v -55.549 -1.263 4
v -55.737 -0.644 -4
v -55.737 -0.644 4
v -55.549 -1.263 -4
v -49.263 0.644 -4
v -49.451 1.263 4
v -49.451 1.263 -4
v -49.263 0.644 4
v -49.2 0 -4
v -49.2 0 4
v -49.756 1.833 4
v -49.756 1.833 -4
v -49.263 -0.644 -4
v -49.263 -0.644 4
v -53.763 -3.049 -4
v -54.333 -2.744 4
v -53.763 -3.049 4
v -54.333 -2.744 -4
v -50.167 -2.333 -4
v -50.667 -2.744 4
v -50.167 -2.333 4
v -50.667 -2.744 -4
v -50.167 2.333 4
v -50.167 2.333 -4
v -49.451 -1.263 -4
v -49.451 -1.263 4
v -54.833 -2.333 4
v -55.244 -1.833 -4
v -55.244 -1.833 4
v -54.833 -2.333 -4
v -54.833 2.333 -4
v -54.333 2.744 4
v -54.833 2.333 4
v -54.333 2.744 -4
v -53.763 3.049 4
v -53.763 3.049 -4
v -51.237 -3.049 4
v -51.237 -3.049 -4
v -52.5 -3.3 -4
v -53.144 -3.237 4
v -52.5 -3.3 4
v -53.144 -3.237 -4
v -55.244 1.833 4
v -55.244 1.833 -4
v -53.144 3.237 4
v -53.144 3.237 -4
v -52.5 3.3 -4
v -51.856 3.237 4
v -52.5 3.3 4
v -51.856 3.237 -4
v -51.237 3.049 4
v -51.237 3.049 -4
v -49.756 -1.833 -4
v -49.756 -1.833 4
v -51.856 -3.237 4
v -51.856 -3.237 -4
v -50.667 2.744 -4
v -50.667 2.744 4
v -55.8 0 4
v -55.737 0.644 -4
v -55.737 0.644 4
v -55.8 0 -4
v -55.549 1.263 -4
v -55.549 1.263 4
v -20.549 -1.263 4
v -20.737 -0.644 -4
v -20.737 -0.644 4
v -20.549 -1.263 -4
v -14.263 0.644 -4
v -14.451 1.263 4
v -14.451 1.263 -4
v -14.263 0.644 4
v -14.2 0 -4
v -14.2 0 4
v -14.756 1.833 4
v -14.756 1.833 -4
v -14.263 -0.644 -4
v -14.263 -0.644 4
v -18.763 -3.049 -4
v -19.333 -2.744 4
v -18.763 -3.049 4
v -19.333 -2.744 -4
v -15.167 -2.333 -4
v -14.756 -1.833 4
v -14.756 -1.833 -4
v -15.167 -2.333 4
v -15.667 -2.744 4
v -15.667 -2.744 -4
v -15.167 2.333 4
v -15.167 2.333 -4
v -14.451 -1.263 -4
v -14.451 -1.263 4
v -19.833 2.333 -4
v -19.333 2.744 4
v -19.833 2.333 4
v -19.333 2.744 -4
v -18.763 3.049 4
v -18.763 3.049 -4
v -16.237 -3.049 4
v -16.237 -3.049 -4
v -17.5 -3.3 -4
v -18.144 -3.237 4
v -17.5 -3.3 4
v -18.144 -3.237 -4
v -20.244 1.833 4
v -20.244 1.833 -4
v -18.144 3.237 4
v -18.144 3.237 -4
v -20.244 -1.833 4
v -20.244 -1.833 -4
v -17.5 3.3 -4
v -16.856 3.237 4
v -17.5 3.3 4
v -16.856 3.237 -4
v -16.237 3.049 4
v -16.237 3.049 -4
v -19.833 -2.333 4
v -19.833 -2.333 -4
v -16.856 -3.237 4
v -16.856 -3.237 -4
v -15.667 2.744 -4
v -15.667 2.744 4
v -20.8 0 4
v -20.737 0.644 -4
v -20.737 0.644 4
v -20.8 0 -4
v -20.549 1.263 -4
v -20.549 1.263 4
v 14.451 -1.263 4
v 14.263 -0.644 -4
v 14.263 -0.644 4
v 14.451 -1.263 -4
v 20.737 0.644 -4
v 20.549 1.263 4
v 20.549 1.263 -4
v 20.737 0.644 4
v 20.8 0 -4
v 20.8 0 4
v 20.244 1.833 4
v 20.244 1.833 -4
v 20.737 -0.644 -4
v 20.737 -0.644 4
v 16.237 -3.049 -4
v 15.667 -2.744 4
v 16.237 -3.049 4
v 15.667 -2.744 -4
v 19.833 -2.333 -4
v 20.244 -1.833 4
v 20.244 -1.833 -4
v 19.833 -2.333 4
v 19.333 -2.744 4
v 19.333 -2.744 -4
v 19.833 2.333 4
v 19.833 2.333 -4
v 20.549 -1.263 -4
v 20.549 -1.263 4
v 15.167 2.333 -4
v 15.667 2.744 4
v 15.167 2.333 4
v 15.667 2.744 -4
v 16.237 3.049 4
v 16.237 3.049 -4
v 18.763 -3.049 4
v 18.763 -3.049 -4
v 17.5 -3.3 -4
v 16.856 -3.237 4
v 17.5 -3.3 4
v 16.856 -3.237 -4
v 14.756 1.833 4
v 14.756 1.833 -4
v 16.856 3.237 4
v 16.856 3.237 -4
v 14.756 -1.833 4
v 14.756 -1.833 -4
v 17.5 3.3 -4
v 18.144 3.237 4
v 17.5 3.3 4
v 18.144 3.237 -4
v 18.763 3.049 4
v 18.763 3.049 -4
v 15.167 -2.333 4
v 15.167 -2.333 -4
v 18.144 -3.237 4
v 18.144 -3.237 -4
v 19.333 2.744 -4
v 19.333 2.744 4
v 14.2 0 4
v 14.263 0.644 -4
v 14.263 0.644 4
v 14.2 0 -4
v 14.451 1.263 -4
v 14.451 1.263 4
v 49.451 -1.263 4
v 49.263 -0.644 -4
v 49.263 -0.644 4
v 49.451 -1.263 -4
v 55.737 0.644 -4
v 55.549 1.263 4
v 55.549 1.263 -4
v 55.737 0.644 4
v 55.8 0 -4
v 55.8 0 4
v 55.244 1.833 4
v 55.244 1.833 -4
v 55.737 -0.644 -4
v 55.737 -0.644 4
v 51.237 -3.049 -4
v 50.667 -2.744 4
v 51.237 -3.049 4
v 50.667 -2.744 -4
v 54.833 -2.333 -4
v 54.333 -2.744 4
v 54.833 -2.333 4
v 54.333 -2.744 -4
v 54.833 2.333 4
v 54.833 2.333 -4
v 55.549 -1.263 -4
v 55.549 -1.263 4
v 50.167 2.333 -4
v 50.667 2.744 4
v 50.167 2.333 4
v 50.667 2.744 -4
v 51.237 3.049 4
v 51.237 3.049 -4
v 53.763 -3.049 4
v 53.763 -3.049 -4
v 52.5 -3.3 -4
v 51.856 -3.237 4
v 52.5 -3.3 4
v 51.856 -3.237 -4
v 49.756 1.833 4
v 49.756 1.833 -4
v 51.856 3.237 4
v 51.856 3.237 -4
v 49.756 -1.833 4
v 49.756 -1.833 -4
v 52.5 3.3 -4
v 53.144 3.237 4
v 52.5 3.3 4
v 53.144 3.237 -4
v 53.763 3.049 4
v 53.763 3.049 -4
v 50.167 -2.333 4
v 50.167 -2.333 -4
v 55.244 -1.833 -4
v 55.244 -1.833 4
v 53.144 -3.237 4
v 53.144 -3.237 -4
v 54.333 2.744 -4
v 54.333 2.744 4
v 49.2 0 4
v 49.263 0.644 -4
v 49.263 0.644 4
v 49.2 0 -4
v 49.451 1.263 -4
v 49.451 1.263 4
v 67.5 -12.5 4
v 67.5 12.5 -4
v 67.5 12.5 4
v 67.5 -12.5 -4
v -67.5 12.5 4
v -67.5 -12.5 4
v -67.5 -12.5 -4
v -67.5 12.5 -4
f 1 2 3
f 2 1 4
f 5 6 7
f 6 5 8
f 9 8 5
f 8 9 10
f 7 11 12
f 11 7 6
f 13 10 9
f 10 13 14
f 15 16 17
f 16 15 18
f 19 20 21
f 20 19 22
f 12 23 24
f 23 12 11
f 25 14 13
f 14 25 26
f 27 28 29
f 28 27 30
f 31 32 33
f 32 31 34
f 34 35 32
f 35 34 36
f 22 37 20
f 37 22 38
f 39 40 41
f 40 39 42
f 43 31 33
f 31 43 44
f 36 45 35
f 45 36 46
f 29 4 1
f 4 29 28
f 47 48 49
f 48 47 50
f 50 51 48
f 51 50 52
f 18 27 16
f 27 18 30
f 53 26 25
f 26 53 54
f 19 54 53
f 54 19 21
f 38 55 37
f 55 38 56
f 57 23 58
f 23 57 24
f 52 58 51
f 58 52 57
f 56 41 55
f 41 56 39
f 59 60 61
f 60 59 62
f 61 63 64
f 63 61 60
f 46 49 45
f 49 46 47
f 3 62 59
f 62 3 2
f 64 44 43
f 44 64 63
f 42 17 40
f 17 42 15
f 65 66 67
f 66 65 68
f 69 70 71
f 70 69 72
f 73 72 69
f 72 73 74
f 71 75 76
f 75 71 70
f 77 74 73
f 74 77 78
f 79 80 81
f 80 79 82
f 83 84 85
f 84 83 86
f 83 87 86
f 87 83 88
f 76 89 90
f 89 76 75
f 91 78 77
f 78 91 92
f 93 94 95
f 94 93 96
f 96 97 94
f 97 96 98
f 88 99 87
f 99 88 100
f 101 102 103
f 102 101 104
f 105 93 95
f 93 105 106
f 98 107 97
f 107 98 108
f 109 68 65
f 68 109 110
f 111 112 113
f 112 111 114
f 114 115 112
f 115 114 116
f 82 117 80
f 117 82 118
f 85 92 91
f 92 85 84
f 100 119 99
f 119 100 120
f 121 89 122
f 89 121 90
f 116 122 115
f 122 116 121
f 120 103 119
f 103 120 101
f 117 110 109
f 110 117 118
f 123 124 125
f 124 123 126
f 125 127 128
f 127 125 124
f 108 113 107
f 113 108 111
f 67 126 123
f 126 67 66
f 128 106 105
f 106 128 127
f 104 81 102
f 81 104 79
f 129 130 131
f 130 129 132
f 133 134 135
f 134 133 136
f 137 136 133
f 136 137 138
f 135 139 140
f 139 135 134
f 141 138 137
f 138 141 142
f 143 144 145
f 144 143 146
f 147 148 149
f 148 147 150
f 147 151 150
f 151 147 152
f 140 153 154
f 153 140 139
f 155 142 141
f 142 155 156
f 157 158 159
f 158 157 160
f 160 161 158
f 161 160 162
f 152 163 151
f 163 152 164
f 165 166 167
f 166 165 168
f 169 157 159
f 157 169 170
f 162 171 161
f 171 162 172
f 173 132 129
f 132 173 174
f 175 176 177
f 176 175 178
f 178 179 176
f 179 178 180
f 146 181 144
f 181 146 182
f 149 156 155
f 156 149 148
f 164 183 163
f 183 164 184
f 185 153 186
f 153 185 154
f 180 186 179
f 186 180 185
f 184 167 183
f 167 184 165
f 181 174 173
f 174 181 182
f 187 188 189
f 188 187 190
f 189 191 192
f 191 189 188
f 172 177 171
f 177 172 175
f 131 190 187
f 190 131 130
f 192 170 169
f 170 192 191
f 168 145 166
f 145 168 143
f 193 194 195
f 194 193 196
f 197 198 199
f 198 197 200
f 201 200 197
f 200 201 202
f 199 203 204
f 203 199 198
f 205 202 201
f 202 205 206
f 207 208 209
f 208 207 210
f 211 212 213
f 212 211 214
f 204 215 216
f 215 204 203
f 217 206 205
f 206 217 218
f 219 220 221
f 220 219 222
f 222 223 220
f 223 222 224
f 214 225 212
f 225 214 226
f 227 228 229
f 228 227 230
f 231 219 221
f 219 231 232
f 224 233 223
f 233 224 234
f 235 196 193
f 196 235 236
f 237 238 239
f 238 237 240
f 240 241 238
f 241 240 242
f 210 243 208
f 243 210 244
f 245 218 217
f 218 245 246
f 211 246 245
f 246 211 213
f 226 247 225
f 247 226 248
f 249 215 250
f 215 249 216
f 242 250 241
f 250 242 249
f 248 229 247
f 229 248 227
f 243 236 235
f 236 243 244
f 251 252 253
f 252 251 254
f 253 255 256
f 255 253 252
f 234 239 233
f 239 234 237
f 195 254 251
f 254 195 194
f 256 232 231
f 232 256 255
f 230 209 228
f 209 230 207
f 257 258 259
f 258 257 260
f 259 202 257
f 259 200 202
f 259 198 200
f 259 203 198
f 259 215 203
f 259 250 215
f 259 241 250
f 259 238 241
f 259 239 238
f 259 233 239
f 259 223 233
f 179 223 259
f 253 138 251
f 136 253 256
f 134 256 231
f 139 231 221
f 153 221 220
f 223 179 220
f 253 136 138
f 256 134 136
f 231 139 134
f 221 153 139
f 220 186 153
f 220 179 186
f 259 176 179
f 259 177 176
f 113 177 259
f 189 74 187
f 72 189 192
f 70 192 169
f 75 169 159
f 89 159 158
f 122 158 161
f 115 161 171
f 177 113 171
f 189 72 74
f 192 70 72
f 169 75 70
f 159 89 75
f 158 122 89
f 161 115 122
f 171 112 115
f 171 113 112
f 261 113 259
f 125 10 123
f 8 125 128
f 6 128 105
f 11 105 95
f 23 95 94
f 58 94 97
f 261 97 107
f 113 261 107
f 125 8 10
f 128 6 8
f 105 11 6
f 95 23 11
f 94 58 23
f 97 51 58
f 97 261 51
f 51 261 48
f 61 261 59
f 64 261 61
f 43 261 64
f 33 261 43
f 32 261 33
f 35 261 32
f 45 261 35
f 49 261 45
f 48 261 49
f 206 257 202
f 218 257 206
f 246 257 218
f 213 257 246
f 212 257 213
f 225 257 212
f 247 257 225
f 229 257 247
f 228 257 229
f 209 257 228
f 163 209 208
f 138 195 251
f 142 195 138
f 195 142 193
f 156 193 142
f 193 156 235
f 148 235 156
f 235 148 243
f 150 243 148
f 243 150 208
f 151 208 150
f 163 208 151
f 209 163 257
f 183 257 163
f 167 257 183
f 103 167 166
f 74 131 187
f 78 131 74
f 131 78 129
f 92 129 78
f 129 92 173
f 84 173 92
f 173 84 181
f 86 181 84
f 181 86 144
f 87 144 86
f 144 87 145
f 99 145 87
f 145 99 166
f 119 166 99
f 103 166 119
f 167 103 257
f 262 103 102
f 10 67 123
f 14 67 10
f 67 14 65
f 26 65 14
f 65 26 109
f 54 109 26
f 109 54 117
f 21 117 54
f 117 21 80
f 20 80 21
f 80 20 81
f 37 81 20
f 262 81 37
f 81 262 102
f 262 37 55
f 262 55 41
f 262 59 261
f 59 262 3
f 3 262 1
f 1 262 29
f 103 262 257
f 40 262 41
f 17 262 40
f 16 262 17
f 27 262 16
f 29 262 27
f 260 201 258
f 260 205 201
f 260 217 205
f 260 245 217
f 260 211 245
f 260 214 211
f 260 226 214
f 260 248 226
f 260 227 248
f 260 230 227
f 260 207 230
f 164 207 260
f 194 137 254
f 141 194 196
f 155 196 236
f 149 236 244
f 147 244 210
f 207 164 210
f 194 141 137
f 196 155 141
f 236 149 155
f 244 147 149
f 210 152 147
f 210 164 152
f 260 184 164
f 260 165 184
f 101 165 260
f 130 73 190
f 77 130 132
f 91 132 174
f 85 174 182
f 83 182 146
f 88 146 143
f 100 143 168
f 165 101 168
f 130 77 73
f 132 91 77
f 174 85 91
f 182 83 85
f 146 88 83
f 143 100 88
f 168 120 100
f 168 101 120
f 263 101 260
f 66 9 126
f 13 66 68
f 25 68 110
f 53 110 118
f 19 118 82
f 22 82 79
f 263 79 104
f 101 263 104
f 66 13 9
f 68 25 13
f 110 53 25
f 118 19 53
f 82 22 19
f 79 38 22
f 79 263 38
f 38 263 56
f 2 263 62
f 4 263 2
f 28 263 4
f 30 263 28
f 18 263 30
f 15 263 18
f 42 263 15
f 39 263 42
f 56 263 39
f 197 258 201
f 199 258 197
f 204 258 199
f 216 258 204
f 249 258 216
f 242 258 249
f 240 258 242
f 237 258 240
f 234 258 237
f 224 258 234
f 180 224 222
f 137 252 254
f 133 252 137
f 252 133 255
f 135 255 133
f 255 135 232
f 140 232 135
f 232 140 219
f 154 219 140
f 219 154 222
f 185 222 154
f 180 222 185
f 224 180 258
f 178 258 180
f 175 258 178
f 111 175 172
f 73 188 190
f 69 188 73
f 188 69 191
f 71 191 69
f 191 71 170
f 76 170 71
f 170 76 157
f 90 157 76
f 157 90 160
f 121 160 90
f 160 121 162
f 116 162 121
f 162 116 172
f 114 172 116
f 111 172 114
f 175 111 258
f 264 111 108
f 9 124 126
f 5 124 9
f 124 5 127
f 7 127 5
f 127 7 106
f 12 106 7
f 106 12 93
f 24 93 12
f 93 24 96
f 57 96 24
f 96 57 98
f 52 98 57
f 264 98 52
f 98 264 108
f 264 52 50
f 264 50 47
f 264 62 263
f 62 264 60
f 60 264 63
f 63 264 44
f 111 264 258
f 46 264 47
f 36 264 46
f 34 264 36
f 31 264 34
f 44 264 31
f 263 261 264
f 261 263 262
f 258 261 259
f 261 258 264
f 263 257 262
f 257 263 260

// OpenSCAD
$fn = 32;

// ----------------------------------------------------------------------
// Hole bar, 4 x Ø6.6
// skip layout, 15 mm edge offset
// ----------------------------------------------------------------------

// --- parameters (mm) ---
bar_w = 25;         // bar width (Y)
bar_t = 8;          // bar thickness (Z)
holes = 4;          // holes per row
hole_d = 6.6;       // hole diameter
edge = 15;          // offset from the bar end to the first hole
grid_pitch = 17.5;  // grid the bar was laid out on

// --- derived feature positions (mm) ---
pitch = grid_pitch * 2;       // = 35   holes sit every other grid slot
span = (holes - 1) * pitch;   // = 105   distance between the end holes
bar_l = span + 2 * edge;      // = 135   overall bar length
start_x = -bar_l / 2 + edge;  // = -52.5   X of the first hole
feature_centers = [
  [start_x + 0 * pitch, 0],
  [start_x + 1 * pitch, 0],
  [start_x + 2 * pitch, 0],
  [start_x + 3 * pitch, 0]
];   // hole centres of the first row

// bar with one row of holes, drilled from feature_centers
difference() {
  translate([-bar_l / 2, -bar_w / 2, -bar_t / 2]) cube([bar_l, bar_w, bar_t]);
  for (centre = feature_centers)
    translate([centre[0], centre[1], 0])
      cylinder(d = hole_d, h = bar_t + 2, center = true);
}
